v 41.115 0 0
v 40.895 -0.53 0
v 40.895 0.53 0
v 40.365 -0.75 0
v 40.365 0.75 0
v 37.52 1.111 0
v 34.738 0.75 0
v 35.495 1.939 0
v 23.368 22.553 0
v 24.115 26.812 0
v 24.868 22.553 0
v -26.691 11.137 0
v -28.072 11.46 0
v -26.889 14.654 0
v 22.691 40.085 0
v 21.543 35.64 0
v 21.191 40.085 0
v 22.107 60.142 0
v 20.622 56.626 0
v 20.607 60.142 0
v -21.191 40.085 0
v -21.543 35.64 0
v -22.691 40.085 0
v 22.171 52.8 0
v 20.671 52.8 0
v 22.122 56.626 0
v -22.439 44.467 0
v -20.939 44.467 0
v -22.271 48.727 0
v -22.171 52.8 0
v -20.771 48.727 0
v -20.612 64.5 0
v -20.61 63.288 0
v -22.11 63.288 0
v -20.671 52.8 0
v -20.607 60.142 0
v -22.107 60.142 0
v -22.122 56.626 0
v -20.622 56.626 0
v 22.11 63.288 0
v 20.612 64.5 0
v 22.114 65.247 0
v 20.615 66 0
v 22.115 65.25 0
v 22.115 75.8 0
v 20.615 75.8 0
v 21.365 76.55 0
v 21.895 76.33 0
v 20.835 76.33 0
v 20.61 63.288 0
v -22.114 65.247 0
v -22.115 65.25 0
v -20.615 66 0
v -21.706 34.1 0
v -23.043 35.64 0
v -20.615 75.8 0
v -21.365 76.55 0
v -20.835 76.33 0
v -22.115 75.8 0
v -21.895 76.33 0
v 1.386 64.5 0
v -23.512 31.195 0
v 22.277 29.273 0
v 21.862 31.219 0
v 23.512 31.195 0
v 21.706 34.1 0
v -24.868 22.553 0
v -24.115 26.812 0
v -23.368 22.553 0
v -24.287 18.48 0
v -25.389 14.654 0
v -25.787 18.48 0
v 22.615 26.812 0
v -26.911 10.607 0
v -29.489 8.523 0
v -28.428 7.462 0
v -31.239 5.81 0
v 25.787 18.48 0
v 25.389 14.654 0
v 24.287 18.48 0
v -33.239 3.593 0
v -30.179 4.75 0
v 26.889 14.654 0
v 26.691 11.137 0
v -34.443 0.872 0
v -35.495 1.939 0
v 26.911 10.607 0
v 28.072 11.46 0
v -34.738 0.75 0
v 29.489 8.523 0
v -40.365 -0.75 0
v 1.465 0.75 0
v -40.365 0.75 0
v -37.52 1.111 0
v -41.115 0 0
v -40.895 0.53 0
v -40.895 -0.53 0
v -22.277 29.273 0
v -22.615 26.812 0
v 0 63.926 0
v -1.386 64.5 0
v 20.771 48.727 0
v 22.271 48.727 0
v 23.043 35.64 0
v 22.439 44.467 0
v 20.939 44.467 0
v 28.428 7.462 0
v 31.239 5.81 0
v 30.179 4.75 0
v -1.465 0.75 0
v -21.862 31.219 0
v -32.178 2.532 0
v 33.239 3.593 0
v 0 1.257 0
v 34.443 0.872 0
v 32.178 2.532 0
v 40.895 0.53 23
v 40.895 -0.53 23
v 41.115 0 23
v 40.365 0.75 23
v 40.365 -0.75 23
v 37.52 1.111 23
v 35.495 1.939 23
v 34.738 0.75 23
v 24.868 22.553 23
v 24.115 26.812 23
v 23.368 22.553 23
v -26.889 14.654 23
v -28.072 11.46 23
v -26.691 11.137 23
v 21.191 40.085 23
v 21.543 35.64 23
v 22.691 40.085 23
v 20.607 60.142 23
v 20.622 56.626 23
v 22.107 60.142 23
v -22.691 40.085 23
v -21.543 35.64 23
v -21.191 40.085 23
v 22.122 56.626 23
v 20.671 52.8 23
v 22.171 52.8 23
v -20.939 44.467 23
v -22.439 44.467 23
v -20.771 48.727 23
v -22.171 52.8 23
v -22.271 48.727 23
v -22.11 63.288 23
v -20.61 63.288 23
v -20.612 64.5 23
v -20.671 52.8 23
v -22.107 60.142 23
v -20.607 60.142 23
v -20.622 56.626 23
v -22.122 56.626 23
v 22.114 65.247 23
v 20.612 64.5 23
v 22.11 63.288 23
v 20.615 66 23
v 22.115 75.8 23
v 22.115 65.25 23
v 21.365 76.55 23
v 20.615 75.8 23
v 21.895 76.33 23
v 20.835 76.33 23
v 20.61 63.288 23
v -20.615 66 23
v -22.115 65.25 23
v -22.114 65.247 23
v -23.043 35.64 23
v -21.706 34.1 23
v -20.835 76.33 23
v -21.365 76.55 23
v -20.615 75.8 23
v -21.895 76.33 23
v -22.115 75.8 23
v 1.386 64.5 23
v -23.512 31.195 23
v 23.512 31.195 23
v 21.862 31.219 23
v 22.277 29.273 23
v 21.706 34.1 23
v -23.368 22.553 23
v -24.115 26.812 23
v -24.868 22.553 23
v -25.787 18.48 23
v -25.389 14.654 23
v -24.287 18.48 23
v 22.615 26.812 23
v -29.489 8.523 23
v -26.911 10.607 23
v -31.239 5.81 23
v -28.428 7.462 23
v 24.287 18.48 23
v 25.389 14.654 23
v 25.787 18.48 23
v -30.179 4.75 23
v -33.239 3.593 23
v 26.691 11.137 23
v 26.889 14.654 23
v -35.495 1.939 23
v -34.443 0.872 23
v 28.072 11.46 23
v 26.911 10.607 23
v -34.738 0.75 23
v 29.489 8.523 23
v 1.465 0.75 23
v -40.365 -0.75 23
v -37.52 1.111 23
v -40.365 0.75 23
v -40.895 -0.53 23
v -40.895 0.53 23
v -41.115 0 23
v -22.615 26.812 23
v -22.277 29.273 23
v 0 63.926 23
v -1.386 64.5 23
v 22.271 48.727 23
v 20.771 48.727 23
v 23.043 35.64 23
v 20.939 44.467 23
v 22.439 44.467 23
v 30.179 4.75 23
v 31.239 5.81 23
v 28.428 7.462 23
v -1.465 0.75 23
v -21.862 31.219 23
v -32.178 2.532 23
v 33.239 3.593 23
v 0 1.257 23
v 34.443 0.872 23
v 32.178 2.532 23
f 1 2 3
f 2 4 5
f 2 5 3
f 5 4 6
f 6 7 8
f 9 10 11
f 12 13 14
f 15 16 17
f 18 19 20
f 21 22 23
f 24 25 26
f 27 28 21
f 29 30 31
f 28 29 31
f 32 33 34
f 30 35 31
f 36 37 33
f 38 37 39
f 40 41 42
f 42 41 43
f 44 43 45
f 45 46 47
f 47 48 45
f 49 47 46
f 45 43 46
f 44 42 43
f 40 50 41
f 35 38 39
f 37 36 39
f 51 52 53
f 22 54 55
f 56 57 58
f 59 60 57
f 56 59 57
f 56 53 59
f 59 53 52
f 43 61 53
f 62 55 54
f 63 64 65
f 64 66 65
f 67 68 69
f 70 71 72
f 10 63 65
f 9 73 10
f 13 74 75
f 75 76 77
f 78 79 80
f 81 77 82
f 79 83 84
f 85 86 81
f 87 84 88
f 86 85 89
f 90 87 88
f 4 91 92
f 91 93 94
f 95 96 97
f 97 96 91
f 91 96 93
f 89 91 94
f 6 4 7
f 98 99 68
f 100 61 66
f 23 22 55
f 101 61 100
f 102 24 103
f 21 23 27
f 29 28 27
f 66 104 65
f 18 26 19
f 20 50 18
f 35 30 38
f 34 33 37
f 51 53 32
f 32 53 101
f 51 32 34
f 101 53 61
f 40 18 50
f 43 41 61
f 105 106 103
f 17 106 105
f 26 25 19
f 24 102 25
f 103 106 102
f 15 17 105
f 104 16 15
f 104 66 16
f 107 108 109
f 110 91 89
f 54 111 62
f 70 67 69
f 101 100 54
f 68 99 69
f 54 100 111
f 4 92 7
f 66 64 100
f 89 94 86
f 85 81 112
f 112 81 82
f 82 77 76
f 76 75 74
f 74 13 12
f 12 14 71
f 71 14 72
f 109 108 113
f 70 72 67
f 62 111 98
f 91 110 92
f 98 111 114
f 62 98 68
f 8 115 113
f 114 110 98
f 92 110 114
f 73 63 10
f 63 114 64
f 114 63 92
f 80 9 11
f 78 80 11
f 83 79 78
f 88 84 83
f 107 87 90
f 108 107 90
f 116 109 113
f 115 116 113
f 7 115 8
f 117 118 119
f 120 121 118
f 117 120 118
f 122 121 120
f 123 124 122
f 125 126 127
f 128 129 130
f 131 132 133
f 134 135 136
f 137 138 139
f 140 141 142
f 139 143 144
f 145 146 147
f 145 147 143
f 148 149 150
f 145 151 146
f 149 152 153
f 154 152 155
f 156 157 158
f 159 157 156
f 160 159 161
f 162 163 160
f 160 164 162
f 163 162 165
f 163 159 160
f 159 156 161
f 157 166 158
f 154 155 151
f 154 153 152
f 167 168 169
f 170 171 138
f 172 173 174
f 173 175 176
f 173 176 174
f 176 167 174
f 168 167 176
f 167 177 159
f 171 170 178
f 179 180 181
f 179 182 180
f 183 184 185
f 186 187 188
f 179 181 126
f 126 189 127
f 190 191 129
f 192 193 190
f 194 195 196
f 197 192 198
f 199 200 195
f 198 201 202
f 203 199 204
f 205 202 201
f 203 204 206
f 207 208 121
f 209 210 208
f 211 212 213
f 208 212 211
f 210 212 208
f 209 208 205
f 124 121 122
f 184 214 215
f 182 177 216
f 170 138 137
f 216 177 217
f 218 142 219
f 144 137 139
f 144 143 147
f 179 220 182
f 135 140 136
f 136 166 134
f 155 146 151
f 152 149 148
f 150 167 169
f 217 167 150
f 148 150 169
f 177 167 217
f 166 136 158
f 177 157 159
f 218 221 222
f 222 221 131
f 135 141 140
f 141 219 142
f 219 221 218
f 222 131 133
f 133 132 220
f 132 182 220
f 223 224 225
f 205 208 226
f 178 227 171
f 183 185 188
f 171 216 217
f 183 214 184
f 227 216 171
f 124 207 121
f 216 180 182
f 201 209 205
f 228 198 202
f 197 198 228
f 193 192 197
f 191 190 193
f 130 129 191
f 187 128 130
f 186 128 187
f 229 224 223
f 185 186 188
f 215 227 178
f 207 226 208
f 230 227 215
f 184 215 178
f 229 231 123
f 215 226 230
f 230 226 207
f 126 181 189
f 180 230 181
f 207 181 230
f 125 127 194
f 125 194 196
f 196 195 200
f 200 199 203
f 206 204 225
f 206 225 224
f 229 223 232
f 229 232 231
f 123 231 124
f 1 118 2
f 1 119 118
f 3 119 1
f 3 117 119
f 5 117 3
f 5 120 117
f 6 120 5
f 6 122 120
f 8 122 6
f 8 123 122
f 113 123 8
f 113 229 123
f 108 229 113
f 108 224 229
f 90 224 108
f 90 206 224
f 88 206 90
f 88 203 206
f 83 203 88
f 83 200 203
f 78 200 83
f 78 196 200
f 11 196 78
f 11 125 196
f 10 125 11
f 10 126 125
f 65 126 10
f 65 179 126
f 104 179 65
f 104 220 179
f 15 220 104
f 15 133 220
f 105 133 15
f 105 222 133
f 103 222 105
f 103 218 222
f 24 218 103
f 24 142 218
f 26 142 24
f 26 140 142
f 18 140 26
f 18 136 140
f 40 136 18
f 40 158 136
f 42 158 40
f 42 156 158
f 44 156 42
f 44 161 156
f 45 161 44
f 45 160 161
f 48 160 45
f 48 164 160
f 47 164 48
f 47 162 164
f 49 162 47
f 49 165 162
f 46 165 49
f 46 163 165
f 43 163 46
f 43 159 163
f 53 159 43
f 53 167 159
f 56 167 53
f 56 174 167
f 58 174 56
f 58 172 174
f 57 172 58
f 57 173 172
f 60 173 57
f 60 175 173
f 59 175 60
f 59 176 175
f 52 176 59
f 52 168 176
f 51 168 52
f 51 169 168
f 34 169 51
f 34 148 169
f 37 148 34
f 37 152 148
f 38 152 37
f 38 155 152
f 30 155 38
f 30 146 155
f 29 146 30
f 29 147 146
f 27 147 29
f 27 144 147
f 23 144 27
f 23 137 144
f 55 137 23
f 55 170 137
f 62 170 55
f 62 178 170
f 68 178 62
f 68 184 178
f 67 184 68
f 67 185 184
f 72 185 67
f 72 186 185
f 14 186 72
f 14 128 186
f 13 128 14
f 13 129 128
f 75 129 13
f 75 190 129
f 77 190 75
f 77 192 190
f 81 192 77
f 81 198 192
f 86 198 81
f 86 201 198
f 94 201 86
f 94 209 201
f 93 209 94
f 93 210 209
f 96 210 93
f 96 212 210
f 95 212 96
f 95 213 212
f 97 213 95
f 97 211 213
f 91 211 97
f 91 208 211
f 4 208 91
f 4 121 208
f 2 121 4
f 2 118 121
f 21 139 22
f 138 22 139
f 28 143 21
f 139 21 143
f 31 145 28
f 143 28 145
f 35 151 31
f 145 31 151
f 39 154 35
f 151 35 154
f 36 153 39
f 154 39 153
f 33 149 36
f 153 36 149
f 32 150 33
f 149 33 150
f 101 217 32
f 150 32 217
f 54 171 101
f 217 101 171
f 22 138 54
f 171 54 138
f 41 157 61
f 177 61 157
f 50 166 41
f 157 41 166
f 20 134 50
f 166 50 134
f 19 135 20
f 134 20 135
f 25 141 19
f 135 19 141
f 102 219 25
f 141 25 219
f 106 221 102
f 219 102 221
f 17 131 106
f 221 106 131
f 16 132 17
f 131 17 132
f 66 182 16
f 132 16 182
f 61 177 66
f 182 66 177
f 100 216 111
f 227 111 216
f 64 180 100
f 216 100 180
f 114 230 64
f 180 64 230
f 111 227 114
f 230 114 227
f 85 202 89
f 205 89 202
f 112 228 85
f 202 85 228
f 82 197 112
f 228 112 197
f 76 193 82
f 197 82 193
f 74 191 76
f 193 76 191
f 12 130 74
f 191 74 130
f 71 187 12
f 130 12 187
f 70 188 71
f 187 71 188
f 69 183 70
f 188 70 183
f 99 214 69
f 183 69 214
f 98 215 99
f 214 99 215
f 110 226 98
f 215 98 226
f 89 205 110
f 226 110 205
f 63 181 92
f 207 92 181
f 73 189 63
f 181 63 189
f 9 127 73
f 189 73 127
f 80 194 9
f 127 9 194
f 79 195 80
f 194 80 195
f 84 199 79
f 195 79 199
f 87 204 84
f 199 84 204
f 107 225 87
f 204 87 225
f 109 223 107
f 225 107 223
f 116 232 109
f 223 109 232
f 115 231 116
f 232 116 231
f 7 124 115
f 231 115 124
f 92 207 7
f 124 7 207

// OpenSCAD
// file: ribbon.scad
module ribbon(points, thickness=1, closed=false) {
    p = closed ? concat(points, [points[0]]) : points;
    
    union() {
        for (i=[1:len(p)-1]) {
            hull() {
                translate(p[i-1]) circle(d=thickness, $fn=8);
                translate(p[i]) circle(d=thickness, $fn=8);
            }
        }
    }
}

pi = 3.1415926535897932;
function SIN(theta) = sin(theta * 180 / pi);
function COS(theta) = cos(theta * 180 / pi);
function TAN(theta) = tan(theta * 180 / pi);

color("red") linear_extrude(height=10)
 ribbon([for (theta=[0:0.1:2*pi]) [theta * 10 / (2*pi), SIN(theta) * 10 / (2*pi)]], thickness=3, height=10, closed=true);
color("blue") linear_extrude(height=10)
 ribbon([for (theta=[0:0.1:2*pi]) [theta * 10 / (2*pi), SIN(theta) * 10 / (2*pi)]], thickness=.1, height=10, closed=true);
ribbon([for (theta=[0:0.1:2*pi+.1]) [COS(theta)*10, SIN(3*theta) * 10]], thickness=.5);
    
// main file
use <ribbon.scad>;  

tolerance = 0.25;
baseExtra = 20;
bridgeHeight = 66; // original supports: 62.21;
bridgeWidth = 40.73;
supportDepth = 23;
attachmentHeight = 9.8;
thickness = 1.5;

// Public domain Bezier stuff from www.thingiverse.com/thing:8443
function BEZ03(u) = pow((1-u), 3);
function BEZ13(u) = 3*u*(pow((1-u),2));
function BEZ23(u) = 3*(pow(u,2))*(1-u);
function BEZ33(u) = pow(u,3);
function PointAlongBez4(p0, p1, p2, p3, u) = [
	BEZ03(u)*p0[0]+BEZ13(u)*p1[0]+BEZ23(u)*p2[0]+BEZ33(u)*p3[0],
	BEZ03(u)*p0[1]+BEZ13(u)*p1[1]+BEZ23(u)*p2[1]+BEZ33(u)*p3[1]];
// End public domain Bezier stuff

function PointsAlongBez4(p0, p1, p2, p3, precision=0.05) = [for (u=[0:precision:1]) PointAlongBez4(p0, p1, p2, p3, u) ];
    
function trivialMerge(list) = len(list) == 0 ? [] : list[0];
    
function merge(list) = len(list) <= 1 ? trivialMerge(list) : merge([for (i=[1:len(list)-1]) (i==1 ? concat(list[0],list[1]) : list[i])]);
    
function reflectX(list) = [for (i=[0:len(list)-1]) let(j=len(list)-1-i) [-list[j][0],list[j][1]]];

leftPoints = merge( [ [[0,0],[-baseExtra-bridgeWidth/2,0]], 
    PointsAlongBez4([-baseExtra-bridgeWidth/2,0], [(-baseExtra*0-bridgeWidth/2), 0], [-bridgeWidth/2-thickness/2-tolerance, bridgeHeight*0.75], [-bridgeWidth/2-thickness/2-tolerance, bridgeHeight]),
    [[-bridgeWidth/2-thickness/2-tolerance, bridgeHeight+attachmentHeight], 
    [-bridgeWidth/2-thickness/2-tolerance, bridgeHeight-thickness/2]]] ); 
rightPoints = reflectX(leftPoints);
crossBeam1 = [[0,0], leftPoints[13], [0,bridgeHeight-thickness/2]];

linear_extrude(height=supportDepth) union() {
    ribbon(concat(leftPoints,rightPoints),thickness=thickness);
    ribbon(crossBeam1,thickness=thickness);
    ribbon(reflectX(crossBeam1),thickness=thickness);
}
